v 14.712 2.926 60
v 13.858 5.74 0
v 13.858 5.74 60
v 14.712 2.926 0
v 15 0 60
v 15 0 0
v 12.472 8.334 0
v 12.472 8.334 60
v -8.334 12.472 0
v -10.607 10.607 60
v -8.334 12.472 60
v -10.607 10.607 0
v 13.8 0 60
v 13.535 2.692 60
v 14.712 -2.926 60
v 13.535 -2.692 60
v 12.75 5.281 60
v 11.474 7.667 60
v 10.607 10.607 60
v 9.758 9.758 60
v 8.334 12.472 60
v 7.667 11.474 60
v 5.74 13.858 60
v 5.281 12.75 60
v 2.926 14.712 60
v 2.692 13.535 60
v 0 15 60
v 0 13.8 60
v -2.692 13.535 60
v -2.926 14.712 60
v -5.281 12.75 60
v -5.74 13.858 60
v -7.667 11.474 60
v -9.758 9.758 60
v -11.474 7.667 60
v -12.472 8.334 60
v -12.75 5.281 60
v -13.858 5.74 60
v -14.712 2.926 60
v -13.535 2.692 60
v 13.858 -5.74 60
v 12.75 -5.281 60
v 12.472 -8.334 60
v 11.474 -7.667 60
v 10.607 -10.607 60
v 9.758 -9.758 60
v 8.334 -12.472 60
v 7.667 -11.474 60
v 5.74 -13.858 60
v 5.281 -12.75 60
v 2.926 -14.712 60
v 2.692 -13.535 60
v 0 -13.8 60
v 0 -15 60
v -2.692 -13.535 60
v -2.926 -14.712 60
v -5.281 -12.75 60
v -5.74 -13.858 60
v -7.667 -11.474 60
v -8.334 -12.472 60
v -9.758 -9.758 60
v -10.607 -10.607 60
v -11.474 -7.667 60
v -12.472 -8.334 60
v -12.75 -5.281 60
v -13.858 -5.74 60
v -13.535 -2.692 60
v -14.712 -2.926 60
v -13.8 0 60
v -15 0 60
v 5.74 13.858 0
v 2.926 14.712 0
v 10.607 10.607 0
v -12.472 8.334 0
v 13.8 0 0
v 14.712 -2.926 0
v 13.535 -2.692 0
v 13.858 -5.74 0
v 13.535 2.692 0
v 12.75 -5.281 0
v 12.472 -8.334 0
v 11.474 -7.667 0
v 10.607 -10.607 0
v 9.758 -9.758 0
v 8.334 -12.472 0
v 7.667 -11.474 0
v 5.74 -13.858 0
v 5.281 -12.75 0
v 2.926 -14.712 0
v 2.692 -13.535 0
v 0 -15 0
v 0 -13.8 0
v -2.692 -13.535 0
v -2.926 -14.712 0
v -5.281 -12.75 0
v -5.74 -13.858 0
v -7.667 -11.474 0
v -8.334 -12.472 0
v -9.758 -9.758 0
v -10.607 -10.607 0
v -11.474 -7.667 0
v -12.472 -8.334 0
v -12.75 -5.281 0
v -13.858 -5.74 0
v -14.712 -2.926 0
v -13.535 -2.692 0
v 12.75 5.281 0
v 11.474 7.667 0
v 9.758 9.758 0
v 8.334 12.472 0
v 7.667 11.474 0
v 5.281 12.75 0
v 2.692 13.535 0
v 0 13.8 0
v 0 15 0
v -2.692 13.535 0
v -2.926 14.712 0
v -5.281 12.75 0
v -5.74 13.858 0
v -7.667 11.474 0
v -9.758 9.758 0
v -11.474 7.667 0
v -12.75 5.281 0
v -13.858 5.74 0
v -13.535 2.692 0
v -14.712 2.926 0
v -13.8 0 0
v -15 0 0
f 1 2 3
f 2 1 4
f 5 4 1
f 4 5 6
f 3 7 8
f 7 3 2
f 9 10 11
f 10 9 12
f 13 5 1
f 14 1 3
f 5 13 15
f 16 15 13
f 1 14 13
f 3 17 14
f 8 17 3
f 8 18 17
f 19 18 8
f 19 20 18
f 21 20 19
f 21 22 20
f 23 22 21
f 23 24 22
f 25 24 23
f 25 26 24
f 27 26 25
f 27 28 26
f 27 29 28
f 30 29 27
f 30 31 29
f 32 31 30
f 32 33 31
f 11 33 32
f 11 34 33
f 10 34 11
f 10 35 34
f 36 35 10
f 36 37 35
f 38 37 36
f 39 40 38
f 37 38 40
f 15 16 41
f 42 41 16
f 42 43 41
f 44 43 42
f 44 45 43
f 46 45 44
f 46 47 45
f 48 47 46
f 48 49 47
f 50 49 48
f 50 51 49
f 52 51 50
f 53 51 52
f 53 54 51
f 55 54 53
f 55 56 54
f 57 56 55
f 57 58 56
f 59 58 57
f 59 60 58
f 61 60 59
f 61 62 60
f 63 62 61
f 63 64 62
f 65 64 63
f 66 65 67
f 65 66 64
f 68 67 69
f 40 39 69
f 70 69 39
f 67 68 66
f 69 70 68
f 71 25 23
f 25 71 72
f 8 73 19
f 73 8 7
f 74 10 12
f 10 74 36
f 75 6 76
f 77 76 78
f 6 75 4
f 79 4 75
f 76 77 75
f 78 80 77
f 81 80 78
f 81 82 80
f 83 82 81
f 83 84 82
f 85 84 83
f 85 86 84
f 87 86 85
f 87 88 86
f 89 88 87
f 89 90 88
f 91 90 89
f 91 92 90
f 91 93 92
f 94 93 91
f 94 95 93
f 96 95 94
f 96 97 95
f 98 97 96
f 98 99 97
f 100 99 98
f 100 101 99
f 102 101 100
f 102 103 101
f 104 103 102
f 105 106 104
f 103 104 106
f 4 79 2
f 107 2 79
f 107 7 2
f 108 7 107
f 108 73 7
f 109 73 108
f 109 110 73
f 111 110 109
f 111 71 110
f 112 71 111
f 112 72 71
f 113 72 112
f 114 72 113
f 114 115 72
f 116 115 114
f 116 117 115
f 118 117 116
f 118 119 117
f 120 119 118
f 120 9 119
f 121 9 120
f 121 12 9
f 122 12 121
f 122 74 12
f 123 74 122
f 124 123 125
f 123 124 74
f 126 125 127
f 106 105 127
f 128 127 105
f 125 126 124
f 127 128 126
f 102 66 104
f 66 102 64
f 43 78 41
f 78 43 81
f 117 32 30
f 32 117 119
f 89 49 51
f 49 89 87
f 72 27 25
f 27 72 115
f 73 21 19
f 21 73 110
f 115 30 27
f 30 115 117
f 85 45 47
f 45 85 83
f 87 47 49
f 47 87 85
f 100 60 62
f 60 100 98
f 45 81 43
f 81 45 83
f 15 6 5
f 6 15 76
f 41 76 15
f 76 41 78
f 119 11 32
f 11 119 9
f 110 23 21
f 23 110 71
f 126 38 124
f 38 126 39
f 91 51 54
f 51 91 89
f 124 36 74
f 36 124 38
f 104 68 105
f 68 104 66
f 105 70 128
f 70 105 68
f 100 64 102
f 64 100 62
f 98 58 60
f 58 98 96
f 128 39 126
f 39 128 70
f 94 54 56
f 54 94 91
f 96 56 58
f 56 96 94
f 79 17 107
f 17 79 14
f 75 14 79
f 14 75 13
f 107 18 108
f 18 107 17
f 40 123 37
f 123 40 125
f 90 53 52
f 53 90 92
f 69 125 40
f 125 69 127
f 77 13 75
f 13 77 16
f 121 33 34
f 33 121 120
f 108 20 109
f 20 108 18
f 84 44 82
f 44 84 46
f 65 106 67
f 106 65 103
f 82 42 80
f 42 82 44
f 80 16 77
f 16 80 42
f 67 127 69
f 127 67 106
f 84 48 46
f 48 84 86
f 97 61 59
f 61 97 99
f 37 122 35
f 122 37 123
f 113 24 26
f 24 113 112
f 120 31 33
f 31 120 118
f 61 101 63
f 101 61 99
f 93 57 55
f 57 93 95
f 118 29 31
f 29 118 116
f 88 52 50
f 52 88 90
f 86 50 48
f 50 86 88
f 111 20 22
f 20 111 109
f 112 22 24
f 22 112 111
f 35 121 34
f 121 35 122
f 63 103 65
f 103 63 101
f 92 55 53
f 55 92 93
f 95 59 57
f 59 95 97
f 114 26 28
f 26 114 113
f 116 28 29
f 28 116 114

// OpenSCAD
$fn = 32;

// ----------------------------------------------------------------------
// Thin tube: 1.2 mm wall
// ----------------------------------------------------------------------

// --- parameters (mm) ---
tube_od = 30;             // outer diameter
tube_h = 60;              // height, Z
wall = 1.2;               // wall thickness
fit_tol = 0.1;            // tolerance for press fits, mm
free_tol = 0.5;           // tolerance for clearance fits, mm

difference() {
  cylinder(h = tube_h, d = tube_od);
  translate([0, 0, -1]) cylinder(h = tube_h + 2, d = tube_od - 2 * wall);
}
